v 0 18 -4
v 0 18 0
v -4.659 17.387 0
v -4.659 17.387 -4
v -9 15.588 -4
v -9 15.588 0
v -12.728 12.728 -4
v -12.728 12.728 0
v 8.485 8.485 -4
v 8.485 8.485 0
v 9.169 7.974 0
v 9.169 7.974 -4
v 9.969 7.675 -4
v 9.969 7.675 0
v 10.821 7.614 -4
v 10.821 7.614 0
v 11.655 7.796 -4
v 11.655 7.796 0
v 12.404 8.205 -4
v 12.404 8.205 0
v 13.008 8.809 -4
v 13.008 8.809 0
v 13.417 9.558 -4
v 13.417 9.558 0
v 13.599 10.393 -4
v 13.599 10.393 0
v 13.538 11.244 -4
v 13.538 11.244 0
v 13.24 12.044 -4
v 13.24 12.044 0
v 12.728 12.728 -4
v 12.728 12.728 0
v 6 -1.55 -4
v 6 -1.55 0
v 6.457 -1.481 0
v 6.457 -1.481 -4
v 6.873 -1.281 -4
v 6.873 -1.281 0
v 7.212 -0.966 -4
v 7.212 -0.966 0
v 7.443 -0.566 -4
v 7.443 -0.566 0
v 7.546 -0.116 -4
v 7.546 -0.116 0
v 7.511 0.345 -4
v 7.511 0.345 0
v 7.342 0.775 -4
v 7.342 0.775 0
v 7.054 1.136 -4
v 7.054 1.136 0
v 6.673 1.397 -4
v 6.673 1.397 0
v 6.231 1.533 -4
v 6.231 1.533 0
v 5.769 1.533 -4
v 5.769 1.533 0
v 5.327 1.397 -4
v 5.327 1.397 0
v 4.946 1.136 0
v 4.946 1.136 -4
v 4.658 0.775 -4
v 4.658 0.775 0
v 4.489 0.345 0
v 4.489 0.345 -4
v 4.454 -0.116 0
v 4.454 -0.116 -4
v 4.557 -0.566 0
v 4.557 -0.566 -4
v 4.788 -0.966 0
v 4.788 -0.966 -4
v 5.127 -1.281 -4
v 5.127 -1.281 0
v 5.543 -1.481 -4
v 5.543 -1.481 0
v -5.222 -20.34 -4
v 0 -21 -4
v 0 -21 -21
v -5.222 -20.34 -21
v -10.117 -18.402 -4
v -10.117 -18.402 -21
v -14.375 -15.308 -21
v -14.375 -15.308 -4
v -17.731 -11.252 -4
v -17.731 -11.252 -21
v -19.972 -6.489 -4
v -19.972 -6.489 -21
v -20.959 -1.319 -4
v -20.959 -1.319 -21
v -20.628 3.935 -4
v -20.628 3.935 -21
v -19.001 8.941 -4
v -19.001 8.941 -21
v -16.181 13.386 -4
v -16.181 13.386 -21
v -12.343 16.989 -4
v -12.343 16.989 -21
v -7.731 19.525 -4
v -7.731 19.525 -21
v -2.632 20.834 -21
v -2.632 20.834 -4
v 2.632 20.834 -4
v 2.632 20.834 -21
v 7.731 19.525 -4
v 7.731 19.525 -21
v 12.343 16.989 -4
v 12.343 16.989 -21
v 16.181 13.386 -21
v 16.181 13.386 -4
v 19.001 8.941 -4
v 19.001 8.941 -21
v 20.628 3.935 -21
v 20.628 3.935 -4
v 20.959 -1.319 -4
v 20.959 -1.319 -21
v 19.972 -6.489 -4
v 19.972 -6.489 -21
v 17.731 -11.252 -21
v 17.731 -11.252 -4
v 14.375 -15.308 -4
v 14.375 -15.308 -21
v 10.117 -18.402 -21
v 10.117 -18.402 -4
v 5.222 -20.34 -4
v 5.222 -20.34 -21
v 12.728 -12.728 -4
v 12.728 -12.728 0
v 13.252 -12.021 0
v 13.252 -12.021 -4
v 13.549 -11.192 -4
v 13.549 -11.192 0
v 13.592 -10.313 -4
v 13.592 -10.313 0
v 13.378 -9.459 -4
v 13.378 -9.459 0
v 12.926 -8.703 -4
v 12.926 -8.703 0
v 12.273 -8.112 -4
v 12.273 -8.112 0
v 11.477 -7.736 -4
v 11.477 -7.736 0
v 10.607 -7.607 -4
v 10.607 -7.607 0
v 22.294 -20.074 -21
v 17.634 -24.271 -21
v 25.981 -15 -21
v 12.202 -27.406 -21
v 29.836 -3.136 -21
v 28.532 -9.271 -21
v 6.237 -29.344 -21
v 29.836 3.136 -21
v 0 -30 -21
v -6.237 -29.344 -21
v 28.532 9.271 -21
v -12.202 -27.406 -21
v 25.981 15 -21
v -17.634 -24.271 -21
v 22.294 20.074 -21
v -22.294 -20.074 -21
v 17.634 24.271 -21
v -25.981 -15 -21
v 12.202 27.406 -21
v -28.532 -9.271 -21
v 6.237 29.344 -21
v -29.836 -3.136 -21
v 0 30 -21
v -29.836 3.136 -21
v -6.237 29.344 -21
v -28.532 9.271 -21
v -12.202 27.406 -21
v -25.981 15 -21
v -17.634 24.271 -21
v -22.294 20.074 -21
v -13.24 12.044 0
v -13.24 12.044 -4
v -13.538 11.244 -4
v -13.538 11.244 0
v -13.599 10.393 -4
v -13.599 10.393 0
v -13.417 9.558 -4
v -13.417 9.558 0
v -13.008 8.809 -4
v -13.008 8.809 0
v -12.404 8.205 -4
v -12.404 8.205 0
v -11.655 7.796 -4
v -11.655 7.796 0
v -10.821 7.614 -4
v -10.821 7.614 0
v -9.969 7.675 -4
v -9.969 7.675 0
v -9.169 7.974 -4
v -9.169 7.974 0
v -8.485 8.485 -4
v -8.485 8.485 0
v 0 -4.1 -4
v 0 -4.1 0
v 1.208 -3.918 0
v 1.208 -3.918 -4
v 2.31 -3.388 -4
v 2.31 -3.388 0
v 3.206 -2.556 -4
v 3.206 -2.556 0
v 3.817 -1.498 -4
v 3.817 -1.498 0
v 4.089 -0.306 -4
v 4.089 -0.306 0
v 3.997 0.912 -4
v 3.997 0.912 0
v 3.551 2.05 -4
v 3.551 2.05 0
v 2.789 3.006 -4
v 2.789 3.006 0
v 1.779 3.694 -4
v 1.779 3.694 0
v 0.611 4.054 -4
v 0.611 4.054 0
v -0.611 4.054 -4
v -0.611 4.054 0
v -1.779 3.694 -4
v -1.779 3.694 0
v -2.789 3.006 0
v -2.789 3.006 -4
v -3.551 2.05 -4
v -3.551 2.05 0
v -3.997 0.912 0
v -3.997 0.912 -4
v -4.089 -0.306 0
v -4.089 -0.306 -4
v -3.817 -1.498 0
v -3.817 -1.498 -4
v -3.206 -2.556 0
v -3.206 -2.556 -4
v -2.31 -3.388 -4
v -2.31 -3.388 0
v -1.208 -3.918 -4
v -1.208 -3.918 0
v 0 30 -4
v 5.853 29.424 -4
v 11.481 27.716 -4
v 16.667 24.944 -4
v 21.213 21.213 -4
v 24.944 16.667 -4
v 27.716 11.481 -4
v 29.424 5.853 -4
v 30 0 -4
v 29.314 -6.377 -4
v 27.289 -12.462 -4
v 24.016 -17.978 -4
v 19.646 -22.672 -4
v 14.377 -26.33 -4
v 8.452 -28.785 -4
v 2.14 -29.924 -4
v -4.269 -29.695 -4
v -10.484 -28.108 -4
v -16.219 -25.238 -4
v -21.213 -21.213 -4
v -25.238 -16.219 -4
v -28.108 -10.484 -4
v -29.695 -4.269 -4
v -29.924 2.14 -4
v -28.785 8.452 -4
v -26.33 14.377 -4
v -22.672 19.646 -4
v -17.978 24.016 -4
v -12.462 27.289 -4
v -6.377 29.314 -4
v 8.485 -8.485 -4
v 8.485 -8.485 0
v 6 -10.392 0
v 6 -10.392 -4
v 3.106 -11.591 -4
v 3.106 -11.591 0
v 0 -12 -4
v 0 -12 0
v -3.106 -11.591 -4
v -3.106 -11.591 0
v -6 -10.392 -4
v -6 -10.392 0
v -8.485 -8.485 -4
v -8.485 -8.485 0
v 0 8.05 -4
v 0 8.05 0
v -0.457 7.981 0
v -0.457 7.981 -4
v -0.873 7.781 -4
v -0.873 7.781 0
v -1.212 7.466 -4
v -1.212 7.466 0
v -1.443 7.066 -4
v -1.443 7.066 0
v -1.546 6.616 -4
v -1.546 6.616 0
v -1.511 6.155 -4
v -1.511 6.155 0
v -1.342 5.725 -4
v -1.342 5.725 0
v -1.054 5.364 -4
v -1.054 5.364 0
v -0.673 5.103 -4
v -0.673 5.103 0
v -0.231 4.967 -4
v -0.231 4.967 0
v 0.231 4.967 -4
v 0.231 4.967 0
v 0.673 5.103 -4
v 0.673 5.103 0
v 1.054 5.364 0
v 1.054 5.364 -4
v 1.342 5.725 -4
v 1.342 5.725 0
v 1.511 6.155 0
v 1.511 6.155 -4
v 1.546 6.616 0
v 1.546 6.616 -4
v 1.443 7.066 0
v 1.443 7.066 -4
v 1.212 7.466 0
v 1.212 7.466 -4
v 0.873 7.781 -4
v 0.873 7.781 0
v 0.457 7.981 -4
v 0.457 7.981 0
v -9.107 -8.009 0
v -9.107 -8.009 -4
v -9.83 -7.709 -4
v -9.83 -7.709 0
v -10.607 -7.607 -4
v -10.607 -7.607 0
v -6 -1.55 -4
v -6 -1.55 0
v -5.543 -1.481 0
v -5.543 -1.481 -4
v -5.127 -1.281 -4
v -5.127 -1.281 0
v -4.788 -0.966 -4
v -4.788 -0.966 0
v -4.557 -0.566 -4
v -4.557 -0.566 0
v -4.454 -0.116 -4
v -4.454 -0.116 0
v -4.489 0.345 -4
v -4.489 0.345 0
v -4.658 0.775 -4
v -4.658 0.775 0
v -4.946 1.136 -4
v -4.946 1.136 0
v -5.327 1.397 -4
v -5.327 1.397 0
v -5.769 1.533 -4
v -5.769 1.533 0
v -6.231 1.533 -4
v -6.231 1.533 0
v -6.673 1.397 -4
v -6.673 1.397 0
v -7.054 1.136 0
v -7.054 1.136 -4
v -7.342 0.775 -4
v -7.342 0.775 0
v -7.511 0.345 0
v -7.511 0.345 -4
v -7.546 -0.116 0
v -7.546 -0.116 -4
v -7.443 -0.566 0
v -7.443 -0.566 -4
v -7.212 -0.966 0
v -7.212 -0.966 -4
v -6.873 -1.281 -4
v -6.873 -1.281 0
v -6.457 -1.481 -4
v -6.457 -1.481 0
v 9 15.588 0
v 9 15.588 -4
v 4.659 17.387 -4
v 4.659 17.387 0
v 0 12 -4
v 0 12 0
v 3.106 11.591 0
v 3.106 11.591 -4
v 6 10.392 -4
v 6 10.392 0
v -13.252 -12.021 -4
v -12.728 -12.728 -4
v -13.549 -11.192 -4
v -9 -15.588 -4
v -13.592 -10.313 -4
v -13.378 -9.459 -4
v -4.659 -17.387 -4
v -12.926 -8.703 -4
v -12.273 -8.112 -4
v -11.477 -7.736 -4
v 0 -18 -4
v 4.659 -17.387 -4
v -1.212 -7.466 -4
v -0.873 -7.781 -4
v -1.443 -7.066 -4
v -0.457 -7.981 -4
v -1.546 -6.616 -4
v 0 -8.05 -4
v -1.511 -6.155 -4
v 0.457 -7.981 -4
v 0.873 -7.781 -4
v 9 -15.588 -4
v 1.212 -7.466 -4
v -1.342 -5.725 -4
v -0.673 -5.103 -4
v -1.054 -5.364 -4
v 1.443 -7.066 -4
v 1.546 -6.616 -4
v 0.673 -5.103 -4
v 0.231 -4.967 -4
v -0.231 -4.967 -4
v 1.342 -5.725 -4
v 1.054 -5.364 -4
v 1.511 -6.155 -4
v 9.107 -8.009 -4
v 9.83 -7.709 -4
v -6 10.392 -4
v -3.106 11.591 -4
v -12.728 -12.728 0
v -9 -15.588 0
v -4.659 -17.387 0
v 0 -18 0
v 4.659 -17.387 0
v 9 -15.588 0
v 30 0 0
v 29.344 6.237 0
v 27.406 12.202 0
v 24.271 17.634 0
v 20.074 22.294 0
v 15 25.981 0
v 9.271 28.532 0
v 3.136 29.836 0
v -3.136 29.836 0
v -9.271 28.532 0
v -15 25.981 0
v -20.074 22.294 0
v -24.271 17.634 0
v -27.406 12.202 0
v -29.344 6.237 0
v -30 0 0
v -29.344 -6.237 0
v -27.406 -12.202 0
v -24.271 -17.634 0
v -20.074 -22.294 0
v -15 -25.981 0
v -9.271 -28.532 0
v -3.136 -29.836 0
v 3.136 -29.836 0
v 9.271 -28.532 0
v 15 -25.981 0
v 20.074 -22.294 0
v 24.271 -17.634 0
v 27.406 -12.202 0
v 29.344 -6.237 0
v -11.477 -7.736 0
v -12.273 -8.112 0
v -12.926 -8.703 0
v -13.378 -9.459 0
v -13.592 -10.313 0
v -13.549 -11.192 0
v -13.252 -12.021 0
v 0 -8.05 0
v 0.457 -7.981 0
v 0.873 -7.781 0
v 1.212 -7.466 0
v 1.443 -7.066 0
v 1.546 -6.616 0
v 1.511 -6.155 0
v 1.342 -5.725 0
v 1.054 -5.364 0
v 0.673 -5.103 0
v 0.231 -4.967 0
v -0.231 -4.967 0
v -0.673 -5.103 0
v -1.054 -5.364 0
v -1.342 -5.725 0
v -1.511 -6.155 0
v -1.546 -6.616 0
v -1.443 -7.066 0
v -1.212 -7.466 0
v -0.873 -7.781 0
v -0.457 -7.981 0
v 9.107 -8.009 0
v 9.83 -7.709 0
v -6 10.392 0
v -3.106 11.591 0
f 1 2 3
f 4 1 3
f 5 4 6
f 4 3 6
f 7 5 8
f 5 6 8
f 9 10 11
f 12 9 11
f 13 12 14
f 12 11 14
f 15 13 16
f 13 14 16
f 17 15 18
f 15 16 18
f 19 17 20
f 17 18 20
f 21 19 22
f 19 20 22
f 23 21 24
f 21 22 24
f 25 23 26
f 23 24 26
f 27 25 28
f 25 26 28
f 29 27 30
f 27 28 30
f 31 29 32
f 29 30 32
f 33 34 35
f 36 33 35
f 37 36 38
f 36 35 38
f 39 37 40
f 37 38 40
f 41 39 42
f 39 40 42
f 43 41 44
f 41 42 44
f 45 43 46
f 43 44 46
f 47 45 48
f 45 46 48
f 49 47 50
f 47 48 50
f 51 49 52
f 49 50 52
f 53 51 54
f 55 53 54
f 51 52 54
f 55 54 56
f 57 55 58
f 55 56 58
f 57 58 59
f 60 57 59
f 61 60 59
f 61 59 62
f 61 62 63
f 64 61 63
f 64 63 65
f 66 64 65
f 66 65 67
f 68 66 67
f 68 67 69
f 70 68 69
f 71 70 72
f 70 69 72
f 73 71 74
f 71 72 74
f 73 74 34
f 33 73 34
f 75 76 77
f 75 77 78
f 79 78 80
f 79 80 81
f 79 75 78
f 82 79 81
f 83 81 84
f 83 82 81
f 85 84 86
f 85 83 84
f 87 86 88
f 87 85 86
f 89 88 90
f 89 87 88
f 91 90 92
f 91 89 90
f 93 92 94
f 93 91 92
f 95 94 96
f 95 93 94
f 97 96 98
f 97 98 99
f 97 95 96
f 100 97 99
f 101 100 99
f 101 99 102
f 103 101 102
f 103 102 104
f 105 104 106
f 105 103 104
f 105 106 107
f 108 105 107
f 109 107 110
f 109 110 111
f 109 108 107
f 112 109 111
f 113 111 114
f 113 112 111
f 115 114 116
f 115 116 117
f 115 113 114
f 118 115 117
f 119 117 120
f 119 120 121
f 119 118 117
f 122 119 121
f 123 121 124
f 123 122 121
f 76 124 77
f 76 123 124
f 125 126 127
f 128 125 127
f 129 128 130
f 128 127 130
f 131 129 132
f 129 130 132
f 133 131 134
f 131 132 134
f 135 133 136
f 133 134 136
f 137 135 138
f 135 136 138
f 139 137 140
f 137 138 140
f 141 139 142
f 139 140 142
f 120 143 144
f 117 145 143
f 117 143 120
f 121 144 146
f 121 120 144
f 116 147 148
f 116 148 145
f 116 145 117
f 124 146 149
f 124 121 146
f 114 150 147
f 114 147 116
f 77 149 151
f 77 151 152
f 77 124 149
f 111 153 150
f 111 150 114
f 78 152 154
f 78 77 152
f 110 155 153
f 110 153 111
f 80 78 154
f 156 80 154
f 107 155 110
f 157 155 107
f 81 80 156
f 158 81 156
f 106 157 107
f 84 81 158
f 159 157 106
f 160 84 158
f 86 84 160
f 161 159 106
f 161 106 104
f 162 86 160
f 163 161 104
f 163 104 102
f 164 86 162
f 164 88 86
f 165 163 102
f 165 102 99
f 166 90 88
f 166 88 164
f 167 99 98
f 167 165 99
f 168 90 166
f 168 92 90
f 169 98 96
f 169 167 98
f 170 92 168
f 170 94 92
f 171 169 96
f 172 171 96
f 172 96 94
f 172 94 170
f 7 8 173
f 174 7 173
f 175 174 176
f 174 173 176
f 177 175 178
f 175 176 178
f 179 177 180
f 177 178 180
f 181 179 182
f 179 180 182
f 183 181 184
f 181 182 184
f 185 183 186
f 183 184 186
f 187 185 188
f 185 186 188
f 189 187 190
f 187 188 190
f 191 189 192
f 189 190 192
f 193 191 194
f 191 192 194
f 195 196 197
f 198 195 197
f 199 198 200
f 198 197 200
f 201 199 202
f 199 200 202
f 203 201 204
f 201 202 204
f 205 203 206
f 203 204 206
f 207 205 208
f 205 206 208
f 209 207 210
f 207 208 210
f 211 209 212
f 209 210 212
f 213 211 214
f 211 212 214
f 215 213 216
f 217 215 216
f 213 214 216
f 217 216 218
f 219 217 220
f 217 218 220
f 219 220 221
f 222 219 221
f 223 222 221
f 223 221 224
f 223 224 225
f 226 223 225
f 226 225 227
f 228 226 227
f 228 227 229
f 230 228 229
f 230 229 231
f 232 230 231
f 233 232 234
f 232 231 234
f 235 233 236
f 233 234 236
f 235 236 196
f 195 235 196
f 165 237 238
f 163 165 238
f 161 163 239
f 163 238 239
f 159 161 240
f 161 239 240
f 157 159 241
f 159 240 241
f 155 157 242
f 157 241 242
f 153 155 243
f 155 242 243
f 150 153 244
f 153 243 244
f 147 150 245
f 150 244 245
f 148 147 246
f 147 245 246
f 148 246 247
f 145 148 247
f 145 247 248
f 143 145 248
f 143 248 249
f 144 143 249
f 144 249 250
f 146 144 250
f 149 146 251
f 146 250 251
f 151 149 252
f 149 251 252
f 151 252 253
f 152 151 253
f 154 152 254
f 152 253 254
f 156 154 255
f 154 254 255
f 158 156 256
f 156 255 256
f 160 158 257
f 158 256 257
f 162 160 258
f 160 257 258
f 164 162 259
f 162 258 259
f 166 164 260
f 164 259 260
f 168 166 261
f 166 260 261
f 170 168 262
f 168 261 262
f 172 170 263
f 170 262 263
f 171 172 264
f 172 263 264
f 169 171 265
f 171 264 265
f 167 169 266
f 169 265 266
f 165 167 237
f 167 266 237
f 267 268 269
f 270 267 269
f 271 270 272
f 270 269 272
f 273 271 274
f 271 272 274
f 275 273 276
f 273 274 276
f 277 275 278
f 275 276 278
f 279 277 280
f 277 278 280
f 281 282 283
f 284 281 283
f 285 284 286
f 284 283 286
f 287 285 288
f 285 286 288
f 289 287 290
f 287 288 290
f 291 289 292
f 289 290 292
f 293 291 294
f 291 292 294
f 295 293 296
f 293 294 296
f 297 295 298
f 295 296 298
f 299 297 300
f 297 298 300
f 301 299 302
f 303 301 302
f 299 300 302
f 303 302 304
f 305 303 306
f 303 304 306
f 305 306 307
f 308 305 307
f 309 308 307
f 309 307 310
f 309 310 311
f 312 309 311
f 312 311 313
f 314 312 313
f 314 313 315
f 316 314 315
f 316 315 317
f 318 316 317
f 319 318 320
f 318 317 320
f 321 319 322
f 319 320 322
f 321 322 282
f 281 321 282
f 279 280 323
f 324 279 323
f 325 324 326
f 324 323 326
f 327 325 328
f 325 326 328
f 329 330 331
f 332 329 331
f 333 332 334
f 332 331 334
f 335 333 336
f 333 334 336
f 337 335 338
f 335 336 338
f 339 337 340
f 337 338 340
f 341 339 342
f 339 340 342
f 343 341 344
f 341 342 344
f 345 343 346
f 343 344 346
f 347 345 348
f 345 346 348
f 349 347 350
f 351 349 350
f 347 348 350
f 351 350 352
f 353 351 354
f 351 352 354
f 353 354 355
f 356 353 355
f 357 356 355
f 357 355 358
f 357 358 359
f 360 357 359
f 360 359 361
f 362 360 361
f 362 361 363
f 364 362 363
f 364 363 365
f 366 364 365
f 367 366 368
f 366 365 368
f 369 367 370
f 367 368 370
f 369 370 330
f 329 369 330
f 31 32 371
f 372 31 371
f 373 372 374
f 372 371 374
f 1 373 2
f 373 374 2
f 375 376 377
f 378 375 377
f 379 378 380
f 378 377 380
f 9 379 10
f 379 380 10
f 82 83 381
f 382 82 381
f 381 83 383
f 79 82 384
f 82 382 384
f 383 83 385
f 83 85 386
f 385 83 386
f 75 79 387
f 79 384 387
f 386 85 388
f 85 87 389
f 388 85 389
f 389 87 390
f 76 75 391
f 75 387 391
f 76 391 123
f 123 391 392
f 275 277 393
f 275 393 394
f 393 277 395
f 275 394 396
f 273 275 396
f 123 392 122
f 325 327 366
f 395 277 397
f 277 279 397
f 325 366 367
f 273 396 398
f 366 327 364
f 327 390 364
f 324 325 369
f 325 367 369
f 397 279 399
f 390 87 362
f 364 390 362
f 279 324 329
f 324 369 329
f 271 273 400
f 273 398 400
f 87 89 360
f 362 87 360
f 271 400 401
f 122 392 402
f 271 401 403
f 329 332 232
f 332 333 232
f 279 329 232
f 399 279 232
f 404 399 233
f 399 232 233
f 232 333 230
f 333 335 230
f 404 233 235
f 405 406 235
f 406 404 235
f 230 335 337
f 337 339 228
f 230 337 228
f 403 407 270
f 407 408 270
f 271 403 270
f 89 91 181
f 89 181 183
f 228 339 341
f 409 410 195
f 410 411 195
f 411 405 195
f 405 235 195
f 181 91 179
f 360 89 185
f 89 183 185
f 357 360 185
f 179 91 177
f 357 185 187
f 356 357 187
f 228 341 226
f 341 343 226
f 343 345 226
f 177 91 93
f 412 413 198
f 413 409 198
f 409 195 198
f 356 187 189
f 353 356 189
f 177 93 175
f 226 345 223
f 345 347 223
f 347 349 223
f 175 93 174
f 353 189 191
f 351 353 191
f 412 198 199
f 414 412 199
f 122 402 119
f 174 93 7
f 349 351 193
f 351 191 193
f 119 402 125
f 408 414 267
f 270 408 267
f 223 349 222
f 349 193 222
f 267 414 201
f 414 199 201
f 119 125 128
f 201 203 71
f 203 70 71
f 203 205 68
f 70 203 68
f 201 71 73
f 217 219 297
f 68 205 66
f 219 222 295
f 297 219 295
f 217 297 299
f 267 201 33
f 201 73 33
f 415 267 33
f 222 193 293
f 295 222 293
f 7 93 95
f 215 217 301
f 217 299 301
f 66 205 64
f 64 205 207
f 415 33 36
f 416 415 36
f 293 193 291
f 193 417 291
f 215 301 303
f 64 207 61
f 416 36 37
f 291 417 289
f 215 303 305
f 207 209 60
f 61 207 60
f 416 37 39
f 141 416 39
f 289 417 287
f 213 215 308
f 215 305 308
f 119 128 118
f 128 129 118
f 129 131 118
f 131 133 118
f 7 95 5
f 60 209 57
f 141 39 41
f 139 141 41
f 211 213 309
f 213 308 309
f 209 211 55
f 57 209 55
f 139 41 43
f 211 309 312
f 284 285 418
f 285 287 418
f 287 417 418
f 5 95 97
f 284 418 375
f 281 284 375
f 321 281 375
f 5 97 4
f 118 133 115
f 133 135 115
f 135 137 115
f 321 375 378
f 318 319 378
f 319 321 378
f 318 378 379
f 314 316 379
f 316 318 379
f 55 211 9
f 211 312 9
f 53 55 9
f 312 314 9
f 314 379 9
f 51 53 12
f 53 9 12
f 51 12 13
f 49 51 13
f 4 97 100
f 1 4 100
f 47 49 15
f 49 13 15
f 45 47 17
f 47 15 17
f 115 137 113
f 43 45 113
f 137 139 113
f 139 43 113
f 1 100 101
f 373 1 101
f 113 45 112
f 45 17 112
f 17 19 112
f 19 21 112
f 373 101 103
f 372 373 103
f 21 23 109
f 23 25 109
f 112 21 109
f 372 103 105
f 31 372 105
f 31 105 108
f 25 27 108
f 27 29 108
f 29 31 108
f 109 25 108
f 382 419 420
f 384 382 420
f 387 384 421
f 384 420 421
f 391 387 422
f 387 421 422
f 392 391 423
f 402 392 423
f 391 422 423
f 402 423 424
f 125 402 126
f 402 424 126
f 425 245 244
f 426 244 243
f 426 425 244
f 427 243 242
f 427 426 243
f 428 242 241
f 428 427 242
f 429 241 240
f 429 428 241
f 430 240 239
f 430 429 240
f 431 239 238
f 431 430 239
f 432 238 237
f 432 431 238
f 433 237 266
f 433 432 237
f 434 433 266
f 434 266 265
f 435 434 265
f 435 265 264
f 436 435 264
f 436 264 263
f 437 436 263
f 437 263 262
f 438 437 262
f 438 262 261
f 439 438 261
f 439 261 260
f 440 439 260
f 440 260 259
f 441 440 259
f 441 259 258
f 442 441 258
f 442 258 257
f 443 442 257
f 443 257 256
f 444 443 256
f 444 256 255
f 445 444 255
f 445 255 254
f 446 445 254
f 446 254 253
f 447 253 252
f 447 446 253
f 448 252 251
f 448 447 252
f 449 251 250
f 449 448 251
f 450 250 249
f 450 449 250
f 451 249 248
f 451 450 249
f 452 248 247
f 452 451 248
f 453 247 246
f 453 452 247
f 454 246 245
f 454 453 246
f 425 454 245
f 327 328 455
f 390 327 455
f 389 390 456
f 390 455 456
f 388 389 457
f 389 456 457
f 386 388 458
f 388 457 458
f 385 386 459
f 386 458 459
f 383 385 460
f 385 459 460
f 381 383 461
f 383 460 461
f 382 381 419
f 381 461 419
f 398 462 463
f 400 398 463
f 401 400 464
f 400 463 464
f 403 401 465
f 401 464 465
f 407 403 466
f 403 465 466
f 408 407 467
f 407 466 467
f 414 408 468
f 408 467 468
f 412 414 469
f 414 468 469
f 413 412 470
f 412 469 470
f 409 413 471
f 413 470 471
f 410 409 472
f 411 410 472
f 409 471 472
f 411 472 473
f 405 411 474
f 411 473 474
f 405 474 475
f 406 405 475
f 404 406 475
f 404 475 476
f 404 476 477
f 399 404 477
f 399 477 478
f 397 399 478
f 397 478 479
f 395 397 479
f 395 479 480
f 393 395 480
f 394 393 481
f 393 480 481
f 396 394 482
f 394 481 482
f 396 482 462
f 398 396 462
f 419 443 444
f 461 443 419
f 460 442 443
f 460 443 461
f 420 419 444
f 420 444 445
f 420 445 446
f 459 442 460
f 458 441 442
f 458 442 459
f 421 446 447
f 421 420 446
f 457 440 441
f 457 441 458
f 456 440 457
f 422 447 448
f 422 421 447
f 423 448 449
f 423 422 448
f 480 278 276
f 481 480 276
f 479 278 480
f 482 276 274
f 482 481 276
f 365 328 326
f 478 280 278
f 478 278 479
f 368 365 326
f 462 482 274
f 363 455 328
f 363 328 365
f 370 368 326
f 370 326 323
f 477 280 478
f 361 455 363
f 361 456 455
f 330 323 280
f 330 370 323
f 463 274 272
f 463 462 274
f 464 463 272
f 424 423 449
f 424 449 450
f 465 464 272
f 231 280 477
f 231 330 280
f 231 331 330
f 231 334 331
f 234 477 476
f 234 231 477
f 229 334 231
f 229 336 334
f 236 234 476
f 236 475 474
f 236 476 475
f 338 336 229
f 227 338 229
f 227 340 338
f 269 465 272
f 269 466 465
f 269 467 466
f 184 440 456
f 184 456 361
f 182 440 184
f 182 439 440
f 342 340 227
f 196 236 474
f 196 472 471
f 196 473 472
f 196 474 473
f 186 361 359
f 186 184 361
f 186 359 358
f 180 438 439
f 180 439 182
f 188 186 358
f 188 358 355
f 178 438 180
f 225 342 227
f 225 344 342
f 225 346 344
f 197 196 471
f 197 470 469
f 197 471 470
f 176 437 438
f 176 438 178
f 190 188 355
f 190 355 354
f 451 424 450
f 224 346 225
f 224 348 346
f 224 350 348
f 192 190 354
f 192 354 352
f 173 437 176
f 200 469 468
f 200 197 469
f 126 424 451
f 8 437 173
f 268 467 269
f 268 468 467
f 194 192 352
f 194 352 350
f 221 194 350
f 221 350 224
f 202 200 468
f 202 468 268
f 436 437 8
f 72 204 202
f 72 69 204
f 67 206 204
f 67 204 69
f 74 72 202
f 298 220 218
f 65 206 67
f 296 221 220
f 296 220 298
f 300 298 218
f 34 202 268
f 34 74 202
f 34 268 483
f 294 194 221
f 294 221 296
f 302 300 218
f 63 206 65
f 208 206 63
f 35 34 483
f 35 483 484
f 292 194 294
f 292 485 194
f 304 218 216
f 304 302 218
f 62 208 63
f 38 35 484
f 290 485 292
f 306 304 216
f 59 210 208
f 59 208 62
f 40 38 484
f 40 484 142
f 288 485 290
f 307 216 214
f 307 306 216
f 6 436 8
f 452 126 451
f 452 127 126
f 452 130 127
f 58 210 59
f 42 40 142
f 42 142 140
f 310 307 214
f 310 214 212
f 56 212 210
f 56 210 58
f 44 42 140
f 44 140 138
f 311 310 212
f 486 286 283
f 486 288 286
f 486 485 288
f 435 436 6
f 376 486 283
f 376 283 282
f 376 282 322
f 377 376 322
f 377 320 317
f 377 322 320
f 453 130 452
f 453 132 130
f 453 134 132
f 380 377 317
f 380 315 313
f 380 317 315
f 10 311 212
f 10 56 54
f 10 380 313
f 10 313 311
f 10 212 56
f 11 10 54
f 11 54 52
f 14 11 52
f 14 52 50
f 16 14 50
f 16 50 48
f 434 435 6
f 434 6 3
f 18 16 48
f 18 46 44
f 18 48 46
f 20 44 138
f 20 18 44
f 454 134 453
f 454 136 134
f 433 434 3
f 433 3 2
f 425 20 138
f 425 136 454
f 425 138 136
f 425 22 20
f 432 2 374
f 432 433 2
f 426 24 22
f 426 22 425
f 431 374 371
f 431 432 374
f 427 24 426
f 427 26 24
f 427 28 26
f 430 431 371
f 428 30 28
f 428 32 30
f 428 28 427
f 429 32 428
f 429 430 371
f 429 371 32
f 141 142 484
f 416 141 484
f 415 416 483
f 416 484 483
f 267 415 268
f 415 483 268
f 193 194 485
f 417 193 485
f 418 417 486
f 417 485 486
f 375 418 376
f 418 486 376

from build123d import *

# Parameters (mm, degrees)
SKETCH1_R           = 30
BOSS_EXTRUDE1_DEPTH = 4
BOSS_EXTRUDE2_START = -17
BOSS_EXTRUDE2_DEPTH = 17


with BuildPart() as part:
    # Sketch1 → Boss-Extrude1 (new body)
    with BuildSketch(Plane.XY):
        Circle(SKETCH1_R)
        with BuildLine():
            ThreePointArc((-12.727922061, -12.727922061), (0, -18), (12.727922061, -12.727922061))
            ThreePointArc((12.727922061, -12.727922061), (13.378240315, -9.458551421), (10.606601718, -7.606601718))
            ThreePointArc((10.606601718, -7.606601718), (9.458551421, -7.83496312), (8.485281374, -8.485281374))
            ThreePointArc((8.485281374, -8.485281374), (0, -12), (-8.485281374, -8.485281374))
            ThreePointArc((-8.485281374, -8.485281374), (-9.458551421, -7.83496312), (-10.606601718, -7.606601718))
            ThreePointArc((-10.606601718, -7.606601718), (-13.378240315, -9.458551421), (-12.727922061, -12.727922061))
        make_face(mode=Mode.SUBTRACT)
        with BuildLine():
            ThreePointArc((8.485281374, 8.485281374), (12.727922061, 8.485281374), (12.727922061, 12.727922061))
            ThreePointArc((12.727922061, 12.727922061), (6.888301783, 16.629831585), (0, 18))
            ThreePointArc((0, 18), (-6.888301783, 16.629831585), (-12.727922061, 12.727922061))
            ThreePointArc((-12.727922061, 12.727922061), (-12.727922061, 8.485281374), (-8.485281374, 8.485281374))
            ThreePointArc((-8.485281374, 8.485281374), (-4.592201188, 11.08655439), (0, 12))
            ThreePointArc((0, 12), (4.592201188, 11.08655439), (8.485281374, 8.485281374))
        make_face(mode=Mode.SUBTRACT)
        with BuildLine():
            ThreePointArc((0, -4.95), (-1.55, -6.5), (0, -8.05))
            ThreePointArc((0, -8.05), (1.55, -6.5), (0, -4.95))
        make_face(mode=Mode.SUBTRACT)
        with BuildLine():
            ThreePointArc((6, 1.55), (4.45, 0), (6, -1.55))
            ThreePointArc((6, -1.55), (7.55, 0), (6, 1.55))
        make_face(mode=Mode.SUBTRACT)
        with BuildLine():
            ThreePointArc((-6, 1.55), (-7.55, 0), (-6, -1.55))
            ThreePointArc((-6, -1.55), (-4.45, 0), (-6, 1.55))
        make_face(mode=Mode.SUBTRACT)
        with BuildLine():
            ThreePointArc((0, 4.95), (1.55, 6.5), (0, 8.05))
            ThreePointArc((0, 8.05), (-1.55, 6.5), (0, 4.95))
        make_face(mode=Mode.SUBTRACT)
        with BuildLine():
            ThreePointArc((0, 4.1), (-4.1, 0), (0, -4.1))
            ThreePointArc((0, -4.1), (4.1, 0), (0, 4.1))
        make_face(mode=Mode.SUBTRACT)
    extrude(amount=-BOSS_EXTRUDE1_DEPTH)

    # Sketch2 → Boss-Extrude2 (add)
    with BuildSketch(Plane(origin=(0, 0, -21), x_dir=(-1, 0, 0), z_dir=(0, 0, -1)).offset(BOSS_EXTRUDE2_START)):
        with BuildLine():
            ThreePointArc((0, -30), (30, 0), (0, 30))
            ThreePointArc((0, 30), (-30, 0), (0, -30))
        make_face()
        with BuildLine():
            ThreePointArc((0, 21), (-21, 0), (0, -21))
            ThreePointArc((0, -21), (21, 0), (0, 21))
        make_face(mode=Mode.SUBTRACT)
    extrude(amount=BOSS_EXTRUDE2_DEPTH)


solid = part.part
